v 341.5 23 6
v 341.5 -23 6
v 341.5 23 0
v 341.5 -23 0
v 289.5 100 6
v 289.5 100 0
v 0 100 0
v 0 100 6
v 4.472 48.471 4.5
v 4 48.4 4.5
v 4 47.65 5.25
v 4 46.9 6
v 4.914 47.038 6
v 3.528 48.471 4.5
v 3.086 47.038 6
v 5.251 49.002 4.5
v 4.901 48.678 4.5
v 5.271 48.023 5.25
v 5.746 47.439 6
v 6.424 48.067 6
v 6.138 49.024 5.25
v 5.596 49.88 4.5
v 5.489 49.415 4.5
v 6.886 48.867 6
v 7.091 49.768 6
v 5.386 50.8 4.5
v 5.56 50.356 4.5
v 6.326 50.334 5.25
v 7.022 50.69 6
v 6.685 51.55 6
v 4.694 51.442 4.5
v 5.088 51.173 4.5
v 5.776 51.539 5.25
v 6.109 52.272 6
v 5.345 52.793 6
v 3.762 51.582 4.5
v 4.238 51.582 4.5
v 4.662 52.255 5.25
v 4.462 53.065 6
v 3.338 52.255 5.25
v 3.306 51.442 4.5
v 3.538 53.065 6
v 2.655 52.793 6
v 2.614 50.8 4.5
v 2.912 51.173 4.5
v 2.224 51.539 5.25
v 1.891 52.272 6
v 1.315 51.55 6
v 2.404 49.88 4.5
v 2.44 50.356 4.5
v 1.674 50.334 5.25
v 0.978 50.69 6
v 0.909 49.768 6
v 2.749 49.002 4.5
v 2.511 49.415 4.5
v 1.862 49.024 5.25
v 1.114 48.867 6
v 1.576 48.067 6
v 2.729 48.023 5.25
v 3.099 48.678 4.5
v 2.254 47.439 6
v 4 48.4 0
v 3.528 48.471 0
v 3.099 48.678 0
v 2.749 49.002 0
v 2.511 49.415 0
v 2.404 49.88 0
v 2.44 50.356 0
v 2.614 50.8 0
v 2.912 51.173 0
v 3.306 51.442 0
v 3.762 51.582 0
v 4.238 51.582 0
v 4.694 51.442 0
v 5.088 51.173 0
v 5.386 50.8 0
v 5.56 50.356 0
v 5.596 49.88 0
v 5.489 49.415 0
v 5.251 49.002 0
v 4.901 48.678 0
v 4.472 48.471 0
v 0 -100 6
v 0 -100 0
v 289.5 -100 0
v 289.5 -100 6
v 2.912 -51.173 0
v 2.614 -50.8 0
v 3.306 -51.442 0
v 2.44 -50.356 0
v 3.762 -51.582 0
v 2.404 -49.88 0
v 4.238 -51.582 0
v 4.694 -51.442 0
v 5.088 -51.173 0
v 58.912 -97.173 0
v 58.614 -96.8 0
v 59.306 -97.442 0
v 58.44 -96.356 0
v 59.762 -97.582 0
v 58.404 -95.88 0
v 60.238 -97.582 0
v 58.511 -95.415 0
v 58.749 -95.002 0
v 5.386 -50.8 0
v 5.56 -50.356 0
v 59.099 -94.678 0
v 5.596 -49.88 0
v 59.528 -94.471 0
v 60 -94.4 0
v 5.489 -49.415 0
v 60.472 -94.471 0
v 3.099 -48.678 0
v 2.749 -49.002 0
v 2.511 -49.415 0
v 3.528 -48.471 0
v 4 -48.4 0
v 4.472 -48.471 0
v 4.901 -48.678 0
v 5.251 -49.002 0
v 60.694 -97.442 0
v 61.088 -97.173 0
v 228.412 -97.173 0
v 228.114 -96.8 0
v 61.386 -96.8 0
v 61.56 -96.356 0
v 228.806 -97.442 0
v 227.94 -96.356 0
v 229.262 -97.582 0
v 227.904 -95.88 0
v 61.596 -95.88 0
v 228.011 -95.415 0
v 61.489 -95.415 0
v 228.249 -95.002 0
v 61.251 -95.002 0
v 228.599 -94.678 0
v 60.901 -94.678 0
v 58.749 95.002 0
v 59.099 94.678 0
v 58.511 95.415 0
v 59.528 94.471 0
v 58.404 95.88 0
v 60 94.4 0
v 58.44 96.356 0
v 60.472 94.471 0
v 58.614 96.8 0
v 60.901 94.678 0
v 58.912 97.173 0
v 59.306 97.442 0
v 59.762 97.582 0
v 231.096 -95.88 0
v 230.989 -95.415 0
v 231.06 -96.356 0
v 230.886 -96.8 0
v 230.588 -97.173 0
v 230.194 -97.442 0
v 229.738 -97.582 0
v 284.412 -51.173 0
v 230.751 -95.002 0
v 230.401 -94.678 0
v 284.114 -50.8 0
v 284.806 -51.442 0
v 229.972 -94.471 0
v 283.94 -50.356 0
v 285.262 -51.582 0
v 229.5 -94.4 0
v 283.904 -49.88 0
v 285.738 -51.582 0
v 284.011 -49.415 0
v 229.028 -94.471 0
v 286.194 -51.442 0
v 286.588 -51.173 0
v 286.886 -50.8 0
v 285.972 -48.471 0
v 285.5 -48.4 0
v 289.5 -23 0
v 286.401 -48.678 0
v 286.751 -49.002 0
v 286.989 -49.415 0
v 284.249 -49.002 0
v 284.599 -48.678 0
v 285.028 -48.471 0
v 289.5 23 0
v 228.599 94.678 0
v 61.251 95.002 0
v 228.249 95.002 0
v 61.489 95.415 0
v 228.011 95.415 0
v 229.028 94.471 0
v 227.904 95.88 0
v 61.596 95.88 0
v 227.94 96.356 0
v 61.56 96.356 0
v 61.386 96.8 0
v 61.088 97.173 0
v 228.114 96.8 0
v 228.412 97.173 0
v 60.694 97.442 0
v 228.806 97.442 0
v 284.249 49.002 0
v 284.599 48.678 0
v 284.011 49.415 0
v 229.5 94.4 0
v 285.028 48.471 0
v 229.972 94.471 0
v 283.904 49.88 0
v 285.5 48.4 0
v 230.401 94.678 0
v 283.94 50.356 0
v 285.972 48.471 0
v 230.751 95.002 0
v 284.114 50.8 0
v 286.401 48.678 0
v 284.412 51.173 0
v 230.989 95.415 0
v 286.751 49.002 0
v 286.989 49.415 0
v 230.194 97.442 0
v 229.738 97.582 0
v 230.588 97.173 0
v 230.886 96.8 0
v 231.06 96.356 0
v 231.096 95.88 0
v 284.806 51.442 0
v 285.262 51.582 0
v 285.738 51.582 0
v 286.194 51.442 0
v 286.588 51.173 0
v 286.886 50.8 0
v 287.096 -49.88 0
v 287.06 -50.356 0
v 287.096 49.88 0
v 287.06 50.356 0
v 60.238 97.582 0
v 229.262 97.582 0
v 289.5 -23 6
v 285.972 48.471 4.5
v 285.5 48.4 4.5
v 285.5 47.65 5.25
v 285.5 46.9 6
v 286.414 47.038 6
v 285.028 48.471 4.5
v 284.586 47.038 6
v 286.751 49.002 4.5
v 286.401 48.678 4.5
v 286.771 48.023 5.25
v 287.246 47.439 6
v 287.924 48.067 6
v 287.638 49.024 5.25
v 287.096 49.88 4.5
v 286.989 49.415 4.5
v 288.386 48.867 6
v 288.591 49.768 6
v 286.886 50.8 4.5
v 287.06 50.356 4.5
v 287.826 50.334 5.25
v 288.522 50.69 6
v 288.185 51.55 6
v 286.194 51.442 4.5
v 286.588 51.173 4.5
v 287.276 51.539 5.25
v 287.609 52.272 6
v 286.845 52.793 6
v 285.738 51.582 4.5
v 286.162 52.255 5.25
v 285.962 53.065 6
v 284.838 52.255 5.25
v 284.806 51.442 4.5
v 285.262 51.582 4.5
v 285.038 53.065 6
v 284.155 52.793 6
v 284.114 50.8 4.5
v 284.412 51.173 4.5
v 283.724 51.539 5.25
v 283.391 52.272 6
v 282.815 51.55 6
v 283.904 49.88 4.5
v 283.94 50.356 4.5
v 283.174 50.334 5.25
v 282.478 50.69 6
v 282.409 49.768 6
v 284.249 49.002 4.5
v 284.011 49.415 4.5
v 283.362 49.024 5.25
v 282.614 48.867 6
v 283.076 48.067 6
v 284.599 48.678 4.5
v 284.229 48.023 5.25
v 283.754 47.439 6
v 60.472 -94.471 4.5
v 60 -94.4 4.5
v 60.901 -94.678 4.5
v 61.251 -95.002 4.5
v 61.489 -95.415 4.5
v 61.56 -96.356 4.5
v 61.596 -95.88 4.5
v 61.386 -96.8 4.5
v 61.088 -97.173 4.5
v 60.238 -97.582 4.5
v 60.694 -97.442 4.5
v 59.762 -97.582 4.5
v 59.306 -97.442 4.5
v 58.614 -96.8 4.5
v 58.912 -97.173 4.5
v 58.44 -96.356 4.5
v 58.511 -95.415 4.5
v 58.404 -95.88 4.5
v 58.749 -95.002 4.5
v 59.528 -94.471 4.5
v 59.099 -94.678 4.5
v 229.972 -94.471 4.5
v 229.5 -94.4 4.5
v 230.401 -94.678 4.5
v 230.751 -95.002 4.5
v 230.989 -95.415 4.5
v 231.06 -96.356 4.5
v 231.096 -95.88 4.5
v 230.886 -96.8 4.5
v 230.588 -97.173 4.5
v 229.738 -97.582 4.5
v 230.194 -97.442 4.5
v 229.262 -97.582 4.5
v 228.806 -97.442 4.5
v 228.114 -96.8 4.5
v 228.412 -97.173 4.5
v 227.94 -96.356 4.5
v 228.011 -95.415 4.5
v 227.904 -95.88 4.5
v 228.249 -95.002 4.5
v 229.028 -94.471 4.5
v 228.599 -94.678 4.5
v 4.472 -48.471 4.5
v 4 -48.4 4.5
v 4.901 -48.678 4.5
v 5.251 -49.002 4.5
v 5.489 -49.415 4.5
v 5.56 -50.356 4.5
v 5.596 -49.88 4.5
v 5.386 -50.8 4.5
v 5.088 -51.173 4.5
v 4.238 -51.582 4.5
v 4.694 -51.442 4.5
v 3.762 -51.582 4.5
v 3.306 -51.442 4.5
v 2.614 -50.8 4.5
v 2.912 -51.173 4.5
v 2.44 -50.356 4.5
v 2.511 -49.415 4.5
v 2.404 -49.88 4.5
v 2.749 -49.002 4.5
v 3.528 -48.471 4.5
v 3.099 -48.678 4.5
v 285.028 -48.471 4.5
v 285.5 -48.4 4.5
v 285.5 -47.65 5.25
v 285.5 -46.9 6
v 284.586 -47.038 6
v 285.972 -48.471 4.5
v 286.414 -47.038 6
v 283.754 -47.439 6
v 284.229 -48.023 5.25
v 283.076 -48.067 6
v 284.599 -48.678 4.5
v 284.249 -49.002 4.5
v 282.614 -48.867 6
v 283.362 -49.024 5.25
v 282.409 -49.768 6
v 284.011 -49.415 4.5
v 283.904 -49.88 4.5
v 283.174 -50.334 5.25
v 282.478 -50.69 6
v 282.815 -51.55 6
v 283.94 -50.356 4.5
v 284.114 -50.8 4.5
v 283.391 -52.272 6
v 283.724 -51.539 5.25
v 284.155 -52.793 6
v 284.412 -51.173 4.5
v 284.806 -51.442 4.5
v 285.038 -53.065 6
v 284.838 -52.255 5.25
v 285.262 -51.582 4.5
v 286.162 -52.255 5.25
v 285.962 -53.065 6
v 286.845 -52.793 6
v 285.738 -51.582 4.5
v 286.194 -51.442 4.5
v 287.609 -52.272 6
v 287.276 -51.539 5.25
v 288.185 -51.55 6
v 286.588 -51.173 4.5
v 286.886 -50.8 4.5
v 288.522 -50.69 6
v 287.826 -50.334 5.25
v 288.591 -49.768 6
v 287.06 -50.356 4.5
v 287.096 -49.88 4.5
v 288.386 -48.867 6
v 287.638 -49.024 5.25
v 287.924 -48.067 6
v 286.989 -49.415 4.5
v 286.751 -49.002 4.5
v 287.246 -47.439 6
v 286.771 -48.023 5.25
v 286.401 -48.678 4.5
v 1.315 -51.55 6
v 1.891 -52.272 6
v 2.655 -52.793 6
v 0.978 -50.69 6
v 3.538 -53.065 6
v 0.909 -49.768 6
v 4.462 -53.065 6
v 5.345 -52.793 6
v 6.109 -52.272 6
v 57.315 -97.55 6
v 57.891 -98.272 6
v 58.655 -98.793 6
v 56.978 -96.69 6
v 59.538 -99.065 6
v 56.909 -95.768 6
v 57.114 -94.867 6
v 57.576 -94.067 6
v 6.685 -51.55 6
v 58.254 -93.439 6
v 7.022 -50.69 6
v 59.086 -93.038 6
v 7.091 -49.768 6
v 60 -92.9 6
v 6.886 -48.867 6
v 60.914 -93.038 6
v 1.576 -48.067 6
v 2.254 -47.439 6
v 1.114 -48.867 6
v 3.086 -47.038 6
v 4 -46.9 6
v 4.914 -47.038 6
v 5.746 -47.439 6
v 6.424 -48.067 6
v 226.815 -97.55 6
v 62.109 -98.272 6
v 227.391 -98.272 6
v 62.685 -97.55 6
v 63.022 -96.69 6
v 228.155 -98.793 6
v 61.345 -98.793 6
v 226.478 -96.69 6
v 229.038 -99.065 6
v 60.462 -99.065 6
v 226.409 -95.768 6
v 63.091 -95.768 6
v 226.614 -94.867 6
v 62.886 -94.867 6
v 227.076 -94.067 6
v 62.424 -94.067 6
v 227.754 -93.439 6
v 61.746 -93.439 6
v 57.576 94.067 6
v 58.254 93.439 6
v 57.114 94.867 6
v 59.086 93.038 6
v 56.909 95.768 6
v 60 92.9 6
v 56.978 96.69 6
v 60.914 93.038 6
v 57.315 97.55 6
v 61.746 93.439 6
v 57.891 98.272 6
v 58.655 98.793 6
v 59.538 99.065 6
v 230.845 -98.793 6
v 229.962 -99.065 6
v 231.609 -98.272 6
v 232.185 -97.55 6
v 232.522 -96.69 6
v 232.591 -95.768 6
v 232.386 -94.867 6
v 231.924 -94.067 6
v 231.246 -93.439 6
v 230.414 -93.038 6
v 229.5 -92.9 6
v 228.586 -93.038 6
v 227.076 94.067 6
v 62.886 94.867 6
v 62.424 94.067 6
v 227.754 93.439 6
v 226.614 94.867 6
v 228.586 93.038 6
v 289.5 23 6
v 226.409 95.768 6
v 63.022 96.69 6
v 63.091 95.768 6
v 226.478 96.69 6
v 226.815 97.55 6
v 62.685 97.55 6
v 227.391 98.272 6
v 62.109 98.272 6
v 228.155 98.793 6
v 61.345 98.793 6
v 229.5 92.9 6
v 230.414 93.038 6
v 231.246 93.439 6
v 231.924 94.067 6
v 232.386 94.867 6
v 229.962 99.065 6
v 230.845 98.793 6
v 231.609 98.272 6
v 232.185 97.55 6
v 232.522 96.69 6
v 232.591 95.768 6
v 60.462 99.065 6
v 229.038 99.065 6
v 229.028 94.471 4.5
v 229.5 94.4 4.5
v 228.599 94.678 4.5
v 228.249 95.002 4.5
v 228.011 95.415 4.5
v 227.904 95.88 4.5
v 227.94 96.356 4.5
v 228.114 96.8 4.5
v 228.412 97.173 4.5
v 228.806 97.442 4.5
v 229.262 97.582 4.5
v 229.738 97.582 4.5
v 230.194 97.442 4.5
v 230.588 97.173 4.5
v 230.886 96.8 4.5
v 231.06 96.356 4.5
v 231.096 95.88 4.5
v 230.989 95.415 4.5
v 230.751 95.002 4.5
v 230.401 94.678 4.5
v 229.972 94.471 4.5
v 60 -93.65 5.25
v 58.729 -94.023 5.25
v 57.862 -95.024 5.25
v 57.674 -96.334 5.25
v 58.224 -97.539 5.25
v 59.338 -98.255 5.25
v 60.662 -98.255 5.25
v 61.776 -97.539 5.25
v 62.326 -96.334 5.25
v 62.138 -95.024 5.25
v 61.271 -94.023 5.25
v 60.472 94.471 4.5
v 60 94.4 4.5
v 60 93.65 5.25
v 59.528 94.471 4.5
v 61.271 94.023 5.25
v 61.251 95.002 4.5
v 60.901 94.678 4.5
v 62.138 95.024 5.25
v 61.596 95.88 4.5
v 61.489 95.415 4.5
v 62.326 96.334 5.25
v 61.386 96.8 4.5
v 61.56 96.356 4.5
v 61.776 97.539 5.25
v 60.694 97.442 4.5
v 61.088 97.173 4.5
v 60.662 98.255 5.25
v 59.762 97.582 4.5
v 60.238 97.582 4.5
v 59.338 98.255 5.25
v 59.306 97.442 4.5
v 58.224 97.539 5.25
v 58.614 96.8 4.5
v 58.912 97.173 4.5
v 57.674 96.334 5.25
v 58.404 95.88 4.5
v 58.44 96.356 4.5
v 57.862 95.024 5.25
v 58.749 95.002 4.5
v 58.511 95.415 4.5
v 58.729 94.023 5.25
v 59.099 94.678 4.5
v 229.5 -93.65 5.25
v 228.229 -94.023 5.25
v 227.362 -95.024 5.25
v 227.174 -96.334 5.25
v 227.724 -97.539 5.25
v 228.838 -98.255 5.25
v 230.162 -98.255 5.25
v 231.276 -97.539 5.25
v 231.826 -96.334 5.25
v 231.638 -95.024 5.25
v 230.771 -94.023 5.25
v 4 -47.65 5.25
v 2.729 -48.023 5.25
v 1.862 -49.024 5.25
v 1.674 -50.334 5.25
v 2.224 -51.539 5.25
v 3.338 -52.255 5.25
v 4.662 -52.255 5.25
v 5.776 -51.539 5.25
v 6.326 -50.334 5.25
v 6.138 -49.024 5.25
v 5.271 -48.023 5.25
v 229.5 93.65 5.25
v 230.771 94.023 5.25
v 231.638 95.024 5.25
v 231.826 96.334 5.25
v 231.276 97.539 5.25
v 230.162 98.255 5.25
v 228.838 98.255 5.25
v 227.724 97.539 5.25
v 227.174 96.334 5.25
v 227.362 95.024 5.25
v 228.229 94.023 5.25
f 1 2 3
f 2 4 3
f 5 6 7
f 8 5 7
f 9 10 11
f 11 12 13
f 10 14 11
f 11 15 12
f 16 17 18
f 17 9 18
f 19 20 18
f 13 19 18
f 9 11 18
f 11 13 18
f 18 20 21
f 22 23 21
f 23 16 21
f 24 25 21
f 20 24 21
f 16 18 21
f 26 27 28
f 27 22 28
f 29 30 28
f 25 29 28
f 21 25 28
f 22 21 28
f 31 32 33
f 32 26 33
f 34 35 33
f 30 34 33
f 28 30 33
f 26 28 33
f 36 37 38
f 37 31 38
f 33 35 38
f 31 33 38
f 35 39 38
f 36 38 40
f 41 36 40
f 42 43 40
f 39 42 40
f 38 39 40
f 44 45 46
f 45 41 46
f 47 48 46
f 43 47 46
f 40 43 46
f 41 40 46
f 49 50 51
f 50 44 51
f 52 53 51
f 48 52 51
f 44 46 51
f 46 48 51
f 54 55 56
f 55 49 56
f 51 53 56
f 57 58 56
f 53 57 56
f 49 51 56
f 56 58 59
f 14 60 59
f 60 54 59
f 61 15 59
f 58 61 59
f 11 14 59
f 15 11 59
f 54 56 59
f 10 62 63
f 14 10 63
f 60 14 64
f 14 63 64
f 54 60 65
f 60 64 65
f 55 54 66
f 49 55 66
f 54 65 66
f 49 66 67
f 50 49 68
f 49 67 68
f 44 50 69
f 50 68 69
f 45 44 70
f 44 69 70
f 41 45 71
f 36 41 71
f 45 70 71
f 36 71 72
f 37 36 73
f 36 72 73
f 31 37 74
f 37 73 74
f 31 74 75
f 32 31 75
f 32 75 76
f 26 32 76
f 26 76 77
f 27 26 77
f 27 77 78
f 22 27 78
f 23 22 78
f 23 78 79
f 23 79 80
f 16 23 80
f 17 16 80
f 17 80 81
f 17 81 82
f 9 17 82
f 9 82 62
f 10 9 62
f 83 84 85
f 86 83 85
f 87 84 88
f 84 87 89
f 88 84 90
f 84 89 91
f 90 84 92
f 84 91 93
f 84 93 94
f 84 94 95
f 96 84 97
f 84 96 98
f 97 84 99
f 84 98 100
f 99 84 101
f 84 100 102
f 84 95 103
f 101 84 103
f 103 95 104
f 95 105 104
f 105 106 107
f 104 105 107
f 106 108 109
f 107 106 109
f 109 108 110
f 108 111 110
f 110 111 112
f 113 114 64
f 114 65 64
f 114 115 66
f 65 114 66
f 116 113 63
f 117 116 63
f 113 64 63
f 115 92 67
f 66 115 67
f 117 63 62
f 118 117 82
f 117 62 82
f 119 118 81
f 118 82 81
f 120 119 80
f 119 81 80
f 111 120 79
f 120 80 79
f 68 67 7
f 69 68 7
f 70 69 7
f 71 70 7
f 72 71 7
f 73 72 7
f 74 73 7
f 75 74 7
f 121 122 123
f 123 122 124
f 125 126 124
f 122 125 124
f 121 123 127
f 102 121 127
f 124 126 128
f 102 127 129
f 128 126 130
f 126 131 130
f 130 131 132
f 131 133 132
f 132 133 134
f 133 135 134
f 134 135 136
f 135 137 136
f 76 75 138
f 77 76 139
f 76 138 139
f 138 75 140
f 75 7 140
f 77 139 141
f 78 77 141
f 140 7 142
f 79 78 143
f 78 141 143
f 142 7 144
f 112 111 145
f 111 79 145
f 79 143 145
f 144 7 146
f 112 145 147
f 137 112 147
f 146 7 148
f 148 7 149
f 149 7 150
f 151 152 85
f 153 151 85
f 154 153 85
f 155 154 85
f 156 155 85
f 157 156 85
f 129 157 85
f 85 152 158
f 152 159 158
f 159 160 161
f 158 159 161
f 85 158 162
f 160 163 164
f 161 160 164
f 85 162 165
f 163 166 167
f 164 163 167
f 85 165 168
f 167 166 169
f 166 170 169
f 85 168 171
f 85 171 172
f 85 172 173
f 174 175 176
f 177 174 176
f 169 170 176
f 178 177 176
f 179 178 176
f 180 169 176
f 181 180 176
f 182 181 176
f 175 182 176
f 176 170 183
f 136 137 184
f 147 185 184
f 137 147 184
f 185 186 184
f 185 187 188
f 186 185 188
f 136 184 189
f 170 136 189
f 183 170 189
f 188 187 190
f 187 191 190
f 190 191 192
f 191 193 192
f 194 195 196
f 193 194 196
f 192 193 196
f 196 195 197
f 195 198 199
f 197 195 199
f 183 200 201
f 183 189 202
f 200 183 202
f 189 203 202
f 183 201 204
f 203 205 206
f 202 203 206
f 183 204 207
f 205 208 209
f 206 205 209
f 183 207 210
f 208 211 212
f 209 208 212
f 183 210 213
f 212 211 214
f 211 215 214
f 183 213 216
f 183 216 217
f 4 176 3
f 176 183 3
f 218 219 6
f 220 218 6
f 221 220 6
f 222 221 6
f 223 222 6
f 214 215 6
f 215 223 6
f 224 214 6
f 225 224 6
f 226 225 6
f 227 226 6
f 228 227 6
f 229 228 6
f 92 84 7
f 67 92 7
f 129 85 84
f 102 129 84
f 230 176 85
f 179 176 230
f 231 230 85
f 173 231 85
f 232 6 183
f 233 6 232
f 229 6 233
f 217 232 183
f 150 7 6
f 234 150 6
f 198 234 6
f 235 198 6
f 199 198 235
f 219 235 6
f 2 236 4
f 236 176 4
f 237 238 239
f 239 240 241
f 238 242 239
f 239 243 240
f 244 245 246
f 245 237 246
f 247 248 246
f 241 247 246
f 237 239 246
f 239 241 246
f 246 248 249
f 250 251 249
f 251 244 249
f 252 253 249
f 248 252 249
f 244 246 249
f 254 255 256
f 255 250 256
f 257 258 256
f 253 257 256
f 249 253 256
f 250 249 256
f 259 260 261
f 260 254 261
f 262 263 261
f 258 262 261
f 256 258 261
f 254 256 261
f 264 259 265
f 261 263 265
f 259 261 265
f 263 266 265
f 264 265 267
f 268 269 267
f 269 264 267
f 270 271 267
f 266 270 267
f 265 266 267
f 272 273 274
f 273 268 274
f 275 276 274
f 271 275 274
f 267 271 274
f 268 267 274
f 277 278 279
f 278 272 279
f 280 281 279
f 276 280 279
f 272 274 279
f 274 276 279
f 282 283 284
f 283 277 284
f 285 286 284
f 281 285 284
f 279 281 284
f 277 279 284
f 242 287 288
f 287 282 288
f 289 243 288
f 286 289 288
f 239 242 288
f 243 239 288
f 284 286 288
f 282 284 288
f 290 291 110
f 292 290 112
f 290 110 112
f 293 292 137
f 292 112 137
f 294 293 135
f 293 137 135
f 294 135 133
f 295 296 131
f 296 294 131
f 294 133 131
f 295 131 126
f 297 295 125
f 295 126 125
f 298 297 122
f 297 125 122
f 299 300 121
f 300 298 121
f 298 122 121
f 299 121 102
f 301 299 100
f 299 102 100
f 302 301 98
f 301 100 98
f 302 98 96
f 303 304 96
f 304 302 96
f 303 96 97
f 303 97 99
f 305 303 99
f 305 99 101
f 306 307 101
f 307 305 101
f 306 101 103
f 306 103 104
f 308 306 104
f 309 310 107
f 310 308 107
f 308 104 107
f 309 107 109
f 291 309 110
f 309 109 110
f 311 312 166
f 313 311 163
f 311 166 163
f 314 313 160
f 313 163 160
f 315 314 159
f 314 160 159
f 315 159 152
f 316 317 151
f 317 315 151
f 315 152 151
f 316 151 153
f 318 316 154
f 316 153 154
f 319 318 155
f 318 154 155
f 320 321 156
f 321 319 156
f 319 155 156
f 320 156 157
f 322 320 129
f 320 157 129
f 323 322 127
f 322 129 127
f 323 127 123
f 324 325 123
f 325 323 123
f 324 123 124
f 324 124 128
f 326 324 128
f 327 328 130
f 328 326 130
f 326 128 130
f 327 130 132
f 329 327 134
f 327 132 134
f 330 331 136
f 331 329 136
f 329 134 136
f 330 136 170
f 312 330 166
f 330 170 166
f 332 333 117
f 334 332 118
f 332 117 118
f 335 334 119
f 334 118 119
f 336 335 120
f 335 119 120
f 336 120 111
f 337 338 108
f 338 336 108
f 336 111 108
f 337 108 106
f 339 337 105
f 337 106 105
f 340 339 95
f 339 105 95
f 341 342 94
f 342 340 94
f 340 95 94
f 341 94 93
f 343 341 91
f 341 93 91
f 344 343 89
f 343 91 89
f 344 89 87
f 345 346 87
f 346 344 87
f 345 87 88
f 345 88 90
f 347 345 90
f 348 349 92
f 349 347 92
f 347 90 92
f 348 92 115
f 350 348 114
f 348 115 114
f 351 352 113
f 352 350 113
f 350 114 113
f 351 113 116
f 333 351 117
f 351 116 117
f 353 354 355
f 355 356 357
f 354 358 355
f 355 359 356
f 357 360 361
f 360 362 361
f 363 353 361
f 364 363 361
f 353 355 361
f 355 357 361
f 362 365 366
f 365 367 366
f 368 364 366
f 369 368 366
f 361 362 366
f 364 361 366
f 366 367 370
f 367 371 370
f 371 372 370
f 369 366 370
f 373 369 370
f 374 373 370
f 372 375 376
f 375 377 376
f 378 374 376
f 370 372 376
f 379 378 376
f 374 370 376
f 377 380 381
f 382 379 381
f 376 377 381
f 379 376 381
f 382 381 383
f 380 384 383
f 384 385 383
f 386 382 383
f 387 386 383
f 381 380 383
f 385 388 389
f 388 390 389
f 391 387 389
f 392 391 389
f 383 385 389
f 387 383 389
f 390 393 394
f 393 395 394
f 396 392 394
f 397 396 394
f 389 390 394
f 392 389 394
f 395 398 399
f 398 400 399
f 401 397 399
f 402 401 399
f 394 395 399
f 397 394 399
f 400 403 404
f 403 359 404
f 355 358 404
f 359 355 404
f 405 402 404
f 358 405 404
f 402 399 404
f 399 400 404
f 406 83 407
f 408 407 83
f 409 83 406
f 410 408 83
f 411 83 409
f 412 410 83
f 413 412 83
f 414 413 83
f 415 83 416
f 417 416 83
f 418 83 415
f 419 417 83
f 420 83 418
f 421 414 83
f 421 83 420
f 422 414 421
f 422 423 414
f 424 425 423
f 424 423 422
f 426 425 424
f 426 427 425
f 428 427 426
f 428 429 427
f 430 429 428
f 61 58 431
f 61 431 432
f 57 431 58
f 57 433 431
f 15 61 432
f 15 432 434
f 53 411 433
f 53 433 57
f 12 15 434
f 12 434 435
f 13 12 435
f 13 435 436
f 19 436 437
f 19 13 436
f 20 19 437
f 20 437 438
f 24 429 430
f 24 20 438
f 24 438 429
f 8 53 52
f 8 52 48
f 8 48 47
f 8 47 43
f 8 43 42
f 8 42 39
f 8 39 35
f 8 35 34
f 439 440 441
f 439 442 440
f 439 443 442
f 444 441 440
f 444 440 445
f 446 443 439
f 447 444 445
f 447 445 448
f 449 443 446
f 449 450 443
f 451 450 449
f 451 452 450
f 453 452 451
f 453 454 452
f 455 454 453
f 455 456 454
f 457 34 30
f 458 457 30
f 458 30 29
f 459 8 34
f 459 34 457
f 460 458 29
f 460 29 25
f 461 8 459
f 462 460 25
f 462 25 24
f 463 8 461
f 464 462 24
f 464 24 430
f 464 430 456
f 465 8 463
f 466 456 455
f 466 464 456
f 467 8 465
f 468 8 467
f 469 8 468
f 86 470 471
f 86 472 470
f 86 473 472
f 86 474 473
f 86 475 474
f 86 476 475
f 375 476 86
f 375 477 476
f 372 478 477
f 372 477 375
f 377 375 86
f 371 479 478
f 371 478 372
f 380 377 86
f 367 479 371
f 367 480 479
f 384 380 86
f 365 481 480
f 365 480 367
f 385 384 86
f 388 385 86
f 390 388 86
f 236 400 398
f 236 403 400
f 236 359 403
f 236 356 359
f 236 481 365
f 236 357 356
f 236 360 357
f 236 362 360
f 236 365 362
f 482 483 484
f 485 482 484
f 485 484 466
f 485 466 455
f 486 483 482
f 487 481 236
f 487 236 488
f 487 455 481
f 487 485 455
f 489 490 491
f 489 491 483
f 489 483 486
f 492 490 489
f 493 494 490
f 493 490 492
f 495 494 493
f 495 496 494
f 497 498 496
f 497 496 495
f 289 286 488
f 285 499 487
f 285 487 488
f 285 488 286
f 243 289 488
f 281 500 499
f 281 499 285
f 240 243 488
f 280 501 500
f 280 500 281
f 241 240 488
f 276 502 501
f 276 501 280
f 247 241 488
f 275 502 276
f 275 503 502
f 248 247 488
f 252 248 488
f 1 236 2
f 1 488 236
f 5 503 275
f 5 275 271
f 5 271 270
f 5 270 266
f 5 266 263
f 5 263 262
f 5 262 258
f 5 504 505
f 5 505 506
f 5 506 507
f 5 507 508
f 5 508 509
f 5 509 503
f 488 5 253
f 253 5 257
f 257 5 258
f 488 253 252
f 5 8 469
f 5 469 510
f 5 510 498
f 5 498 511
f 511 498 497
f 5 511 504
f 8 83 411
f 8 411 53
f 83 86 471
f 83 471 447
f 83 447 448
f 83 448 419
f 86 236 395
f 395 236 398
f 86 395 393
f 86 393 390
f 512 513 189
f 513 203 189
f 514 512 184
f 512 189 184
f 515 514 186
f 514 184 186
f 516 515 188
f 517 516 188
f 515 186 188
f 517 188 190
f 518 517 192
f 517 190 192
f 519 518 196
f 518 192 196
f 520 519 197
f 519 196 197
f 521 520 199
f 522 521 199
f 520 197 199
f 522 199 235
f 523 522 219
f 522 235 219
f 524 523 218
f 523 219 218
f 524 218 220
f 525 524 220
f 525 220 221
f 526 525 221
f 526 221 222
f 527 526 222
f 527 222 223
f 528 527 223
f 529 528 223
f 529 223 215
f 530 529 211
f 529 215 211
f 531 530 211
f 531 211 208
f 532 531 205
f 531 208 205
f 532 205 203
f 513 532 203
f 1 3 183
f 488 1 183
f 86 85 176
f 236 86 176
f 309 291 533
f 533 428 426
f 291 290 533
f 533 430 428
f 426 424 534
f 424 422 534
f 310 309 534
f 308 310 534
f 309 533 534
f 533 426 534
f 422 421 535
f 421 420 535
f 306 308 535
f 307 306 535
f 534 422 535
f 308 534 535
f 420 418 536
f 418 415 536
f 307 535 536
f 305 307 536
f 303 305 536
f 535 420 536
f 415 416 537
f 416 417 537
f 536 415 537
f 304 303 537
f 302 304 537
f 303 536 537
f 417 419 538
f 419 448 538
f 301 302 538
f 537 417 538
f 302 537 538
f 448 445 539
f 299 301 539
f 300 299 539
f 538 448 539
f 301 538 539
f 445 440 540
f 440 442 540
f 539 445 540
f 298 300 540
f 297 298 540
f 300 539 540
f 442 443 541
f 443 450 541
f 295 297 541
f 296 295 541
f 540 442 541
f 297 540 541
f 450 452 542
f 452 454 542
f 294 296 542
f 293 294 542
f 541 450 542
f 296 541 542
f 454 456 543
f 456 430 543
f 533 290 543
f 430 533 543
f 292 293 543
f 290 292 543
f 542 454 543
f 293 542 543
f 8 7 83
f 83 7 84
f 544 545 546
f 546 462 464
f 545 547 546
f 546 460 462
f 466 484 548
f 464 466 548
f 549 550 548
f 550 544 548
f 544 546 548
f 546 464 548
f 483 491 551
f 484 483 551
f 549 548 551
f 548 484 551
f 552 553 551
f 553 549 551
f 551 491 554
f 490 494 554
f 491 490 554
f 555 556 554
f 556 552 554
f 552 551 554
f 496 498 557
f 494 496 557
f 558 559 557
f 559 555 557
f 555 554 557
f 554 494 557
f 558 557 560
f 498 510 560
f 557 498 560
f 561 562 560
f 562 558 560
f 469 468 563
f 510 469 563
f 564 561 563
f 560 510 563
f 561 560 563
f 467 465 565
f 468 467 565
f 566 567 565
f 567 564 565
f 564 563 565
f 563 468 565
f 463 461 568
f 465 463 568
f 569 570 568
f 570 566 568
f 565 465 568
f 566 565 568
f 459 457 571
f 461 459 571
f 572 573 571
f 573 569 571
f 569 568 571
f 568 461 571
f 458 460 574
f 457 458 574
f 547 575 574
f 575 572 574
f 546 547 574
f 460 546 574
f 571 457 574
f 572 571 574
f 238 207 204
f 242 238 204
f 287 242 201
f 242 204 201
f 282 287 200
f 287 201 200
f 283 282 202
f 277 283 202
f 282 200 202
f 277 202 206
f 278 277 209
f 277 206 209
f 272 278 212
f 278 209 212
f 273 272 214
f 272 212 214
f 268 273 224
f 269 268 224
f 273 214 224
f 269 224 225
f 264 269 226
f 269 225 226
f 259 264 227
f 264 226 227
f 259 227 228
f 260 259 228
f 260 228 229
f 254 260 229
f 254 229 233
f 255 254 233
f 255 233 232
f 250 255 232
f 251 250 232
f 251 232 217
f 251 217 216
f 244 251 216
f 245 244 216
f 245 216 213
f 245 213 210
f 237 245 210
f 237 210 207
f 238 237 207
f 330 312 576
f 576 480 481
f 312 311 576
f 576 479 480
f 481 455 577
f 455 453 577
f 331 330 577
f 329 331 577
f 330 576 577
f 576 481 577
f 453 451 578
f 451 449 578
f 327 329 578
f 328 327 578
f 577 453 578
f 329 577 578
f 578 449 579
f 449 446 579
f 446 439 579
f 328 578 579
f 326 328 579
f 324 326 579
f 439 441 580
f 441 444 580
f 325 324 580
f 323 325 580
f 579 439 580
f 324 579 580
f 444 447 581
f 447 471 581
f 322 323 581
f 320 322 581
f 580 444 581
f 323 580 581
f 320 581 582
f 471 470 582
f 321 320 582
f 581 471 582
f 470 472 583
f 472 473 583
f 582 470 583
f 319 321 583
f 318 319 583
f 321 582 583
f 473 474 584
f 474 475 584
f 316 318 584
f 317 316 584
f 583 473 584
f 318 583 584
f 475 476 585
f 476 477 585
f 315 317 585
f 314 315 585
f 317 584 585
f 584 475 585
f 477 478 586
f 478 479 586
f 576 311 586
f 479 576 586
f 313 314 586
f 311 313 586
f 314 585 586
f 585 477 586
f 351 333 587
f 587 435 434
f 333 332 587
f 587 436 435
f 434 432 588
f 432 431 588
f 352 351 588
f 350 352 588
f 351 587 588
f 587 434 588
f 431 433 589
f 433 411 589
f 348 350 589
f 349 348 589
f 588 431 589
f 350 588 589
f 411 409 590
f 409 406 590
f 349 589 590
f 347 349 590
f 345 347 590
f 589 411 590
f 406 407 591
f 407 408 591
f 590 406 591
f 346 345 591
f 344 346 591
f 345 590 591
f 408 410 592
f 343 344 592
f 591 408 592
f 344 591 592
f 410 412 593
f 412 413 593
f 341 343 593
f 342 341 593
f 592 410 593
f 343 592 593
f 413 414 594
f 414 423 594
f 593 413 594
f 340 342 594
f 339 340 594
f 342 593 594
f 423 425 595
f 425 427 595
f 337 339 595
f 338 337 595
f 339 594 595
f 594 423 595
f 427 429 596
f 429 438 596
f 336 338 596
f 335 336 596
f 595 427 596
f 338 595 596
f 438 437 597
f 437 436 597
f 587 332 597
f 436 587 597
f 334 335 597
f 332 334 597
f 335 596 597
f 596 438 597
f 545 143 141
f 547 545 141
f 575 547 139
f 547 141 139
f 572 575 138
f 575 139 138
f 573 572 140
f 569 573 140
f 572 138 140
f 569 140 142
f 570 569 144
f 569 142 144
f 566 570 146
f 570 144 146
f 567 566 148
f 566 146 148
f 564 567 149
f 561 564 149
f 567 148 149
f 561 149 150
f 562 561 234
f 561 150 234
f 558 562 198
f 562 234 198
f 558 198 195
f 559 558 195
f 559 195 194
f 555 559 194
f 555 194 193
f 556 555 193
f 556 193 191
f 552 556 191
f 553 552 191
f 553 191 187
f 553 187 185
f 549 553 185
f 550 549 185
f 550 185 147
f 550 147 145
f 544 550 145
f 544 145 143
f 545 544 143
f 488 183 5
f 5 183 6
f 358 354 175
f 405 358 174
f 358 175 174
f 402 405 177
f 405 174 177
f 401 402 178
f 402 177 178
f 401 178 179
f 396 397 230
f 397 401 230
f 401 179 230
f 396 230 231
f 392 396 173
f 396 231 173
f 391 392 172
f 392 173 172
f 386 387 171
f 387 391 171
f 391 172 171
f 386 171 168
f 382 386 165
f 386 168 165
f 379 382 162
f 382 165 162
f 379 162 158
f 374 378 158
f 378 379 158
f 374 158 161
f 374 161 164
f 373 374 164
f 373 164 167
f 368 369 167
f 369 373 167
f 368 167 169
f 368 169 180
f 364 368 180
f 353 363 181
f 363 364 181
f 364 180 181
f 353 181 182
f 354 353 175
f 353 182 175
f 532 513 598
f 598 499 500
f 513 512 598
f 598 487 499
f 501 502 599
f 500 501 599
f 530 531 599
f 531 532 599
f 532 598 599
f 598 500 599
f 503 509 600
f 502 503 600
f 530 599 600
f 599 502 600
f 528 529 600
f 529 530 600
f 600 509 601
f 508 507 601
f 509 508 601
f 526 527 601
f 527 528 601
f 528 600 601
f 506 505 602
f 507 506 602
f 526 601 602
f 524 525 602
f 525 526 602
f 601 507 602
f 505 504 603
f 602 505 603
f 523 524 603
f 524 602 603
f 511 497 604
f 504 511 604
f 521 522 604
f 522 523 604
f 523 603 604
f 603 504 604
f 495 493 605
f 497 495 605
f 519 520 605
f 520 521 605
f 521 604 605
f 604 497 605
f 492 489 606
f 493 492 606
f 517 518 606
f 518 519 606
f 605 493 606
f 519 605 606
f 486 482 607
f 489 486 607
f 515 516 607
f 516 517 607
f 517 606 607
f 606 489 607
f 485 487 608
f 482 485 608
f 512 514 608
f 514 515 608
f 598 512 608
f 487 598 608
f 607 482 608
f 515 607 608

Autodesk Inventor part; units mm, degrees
ref_plane "YZ Plane" through (0, 0, 0) normal (1, 0, 0) x (0, 1, 0)
ref_plane "XZ Plane" through (0, 0, 0) normal (0, 1, 0) x (-1, 0, 0)
ref_plane "XY Plane" through (0, 0, 0) normal (0, 0, 1) x (1, 0, 0)
sketch "Skizze1" plane through (0, 0, 0) normal (0, 0, 1) x (1, 0, 0)
  line L0 (0, 120) -> (0, -20) projected
  line L1 (-68.3, 0) -> (409.8, 0) projected
  line L2 (0, 0) -> (217.779, 0)
  line L3 (289.5, 23) -> (289.5, 100)
  line L4 (289.5, 100) -> (0, 100)
  line L5 (0, 100) -> (0, 0)
  line L6 (217.779, 0) -> (341.5, 0)
  line L7 (341.5, 0) -> (341.5, 23)
  line L8 (341.5, 23) -> (289.5, 23)
  dimension "d0" = 52
  dimension "d1" = 289.5
  dimension "d2" = 100
  dimension "d3" = 23
extrude "Extrusion1" add sketch "Skizze1" along normal blind 6
mirror "Spiegeln1" about plane through (217.779, 0, 0) normal (0, -1, 0)
sketch "Skizze2" plane through (0, 0, 6) normal (0, 0, 1) x (1, 0, 0)
  line L0 (0, -100) -> (0, 100) projected
  line L1 (289.5, 100) -> (289.5, 23) projected
  line L2 (0, 100) -> (289.5, 100) projected
  point P0 (0, 0)
  point P1 (60, 96)
  point P2 (229.5, 96)
  point P3 (4, 50)
  point P4 (285.5, 50)
  dimension "d6" = 60
  dimension "d7" = 60
  dimension "d8" = 50
  dimension "d9" = 50
  dimension "d10" = 4
  dimension "d11" = 4
  dimension "d12" = 4
  dimension "d13" = 4
hole "Bohrung1" at (60, 96, 6) at (229.5, 96, 6) at (4, 50, 6) at (285.5, 50, 6) direction (0, 0, -1) diameter 3.2 end through all countersink diameter 6.2 countersink angle 90
mirror "Spiegeln2" about plane through (0, 0, 0) normal (0, 1, 0) of "Bohrung1"
equation "\"d7\" = d6"
equation "\"d11\" = d10"
equation "\"d12\" = d11"
equation "\"d13\" = d12"
properties part number "Deckel2" material "Polycarbonate, Clear"
